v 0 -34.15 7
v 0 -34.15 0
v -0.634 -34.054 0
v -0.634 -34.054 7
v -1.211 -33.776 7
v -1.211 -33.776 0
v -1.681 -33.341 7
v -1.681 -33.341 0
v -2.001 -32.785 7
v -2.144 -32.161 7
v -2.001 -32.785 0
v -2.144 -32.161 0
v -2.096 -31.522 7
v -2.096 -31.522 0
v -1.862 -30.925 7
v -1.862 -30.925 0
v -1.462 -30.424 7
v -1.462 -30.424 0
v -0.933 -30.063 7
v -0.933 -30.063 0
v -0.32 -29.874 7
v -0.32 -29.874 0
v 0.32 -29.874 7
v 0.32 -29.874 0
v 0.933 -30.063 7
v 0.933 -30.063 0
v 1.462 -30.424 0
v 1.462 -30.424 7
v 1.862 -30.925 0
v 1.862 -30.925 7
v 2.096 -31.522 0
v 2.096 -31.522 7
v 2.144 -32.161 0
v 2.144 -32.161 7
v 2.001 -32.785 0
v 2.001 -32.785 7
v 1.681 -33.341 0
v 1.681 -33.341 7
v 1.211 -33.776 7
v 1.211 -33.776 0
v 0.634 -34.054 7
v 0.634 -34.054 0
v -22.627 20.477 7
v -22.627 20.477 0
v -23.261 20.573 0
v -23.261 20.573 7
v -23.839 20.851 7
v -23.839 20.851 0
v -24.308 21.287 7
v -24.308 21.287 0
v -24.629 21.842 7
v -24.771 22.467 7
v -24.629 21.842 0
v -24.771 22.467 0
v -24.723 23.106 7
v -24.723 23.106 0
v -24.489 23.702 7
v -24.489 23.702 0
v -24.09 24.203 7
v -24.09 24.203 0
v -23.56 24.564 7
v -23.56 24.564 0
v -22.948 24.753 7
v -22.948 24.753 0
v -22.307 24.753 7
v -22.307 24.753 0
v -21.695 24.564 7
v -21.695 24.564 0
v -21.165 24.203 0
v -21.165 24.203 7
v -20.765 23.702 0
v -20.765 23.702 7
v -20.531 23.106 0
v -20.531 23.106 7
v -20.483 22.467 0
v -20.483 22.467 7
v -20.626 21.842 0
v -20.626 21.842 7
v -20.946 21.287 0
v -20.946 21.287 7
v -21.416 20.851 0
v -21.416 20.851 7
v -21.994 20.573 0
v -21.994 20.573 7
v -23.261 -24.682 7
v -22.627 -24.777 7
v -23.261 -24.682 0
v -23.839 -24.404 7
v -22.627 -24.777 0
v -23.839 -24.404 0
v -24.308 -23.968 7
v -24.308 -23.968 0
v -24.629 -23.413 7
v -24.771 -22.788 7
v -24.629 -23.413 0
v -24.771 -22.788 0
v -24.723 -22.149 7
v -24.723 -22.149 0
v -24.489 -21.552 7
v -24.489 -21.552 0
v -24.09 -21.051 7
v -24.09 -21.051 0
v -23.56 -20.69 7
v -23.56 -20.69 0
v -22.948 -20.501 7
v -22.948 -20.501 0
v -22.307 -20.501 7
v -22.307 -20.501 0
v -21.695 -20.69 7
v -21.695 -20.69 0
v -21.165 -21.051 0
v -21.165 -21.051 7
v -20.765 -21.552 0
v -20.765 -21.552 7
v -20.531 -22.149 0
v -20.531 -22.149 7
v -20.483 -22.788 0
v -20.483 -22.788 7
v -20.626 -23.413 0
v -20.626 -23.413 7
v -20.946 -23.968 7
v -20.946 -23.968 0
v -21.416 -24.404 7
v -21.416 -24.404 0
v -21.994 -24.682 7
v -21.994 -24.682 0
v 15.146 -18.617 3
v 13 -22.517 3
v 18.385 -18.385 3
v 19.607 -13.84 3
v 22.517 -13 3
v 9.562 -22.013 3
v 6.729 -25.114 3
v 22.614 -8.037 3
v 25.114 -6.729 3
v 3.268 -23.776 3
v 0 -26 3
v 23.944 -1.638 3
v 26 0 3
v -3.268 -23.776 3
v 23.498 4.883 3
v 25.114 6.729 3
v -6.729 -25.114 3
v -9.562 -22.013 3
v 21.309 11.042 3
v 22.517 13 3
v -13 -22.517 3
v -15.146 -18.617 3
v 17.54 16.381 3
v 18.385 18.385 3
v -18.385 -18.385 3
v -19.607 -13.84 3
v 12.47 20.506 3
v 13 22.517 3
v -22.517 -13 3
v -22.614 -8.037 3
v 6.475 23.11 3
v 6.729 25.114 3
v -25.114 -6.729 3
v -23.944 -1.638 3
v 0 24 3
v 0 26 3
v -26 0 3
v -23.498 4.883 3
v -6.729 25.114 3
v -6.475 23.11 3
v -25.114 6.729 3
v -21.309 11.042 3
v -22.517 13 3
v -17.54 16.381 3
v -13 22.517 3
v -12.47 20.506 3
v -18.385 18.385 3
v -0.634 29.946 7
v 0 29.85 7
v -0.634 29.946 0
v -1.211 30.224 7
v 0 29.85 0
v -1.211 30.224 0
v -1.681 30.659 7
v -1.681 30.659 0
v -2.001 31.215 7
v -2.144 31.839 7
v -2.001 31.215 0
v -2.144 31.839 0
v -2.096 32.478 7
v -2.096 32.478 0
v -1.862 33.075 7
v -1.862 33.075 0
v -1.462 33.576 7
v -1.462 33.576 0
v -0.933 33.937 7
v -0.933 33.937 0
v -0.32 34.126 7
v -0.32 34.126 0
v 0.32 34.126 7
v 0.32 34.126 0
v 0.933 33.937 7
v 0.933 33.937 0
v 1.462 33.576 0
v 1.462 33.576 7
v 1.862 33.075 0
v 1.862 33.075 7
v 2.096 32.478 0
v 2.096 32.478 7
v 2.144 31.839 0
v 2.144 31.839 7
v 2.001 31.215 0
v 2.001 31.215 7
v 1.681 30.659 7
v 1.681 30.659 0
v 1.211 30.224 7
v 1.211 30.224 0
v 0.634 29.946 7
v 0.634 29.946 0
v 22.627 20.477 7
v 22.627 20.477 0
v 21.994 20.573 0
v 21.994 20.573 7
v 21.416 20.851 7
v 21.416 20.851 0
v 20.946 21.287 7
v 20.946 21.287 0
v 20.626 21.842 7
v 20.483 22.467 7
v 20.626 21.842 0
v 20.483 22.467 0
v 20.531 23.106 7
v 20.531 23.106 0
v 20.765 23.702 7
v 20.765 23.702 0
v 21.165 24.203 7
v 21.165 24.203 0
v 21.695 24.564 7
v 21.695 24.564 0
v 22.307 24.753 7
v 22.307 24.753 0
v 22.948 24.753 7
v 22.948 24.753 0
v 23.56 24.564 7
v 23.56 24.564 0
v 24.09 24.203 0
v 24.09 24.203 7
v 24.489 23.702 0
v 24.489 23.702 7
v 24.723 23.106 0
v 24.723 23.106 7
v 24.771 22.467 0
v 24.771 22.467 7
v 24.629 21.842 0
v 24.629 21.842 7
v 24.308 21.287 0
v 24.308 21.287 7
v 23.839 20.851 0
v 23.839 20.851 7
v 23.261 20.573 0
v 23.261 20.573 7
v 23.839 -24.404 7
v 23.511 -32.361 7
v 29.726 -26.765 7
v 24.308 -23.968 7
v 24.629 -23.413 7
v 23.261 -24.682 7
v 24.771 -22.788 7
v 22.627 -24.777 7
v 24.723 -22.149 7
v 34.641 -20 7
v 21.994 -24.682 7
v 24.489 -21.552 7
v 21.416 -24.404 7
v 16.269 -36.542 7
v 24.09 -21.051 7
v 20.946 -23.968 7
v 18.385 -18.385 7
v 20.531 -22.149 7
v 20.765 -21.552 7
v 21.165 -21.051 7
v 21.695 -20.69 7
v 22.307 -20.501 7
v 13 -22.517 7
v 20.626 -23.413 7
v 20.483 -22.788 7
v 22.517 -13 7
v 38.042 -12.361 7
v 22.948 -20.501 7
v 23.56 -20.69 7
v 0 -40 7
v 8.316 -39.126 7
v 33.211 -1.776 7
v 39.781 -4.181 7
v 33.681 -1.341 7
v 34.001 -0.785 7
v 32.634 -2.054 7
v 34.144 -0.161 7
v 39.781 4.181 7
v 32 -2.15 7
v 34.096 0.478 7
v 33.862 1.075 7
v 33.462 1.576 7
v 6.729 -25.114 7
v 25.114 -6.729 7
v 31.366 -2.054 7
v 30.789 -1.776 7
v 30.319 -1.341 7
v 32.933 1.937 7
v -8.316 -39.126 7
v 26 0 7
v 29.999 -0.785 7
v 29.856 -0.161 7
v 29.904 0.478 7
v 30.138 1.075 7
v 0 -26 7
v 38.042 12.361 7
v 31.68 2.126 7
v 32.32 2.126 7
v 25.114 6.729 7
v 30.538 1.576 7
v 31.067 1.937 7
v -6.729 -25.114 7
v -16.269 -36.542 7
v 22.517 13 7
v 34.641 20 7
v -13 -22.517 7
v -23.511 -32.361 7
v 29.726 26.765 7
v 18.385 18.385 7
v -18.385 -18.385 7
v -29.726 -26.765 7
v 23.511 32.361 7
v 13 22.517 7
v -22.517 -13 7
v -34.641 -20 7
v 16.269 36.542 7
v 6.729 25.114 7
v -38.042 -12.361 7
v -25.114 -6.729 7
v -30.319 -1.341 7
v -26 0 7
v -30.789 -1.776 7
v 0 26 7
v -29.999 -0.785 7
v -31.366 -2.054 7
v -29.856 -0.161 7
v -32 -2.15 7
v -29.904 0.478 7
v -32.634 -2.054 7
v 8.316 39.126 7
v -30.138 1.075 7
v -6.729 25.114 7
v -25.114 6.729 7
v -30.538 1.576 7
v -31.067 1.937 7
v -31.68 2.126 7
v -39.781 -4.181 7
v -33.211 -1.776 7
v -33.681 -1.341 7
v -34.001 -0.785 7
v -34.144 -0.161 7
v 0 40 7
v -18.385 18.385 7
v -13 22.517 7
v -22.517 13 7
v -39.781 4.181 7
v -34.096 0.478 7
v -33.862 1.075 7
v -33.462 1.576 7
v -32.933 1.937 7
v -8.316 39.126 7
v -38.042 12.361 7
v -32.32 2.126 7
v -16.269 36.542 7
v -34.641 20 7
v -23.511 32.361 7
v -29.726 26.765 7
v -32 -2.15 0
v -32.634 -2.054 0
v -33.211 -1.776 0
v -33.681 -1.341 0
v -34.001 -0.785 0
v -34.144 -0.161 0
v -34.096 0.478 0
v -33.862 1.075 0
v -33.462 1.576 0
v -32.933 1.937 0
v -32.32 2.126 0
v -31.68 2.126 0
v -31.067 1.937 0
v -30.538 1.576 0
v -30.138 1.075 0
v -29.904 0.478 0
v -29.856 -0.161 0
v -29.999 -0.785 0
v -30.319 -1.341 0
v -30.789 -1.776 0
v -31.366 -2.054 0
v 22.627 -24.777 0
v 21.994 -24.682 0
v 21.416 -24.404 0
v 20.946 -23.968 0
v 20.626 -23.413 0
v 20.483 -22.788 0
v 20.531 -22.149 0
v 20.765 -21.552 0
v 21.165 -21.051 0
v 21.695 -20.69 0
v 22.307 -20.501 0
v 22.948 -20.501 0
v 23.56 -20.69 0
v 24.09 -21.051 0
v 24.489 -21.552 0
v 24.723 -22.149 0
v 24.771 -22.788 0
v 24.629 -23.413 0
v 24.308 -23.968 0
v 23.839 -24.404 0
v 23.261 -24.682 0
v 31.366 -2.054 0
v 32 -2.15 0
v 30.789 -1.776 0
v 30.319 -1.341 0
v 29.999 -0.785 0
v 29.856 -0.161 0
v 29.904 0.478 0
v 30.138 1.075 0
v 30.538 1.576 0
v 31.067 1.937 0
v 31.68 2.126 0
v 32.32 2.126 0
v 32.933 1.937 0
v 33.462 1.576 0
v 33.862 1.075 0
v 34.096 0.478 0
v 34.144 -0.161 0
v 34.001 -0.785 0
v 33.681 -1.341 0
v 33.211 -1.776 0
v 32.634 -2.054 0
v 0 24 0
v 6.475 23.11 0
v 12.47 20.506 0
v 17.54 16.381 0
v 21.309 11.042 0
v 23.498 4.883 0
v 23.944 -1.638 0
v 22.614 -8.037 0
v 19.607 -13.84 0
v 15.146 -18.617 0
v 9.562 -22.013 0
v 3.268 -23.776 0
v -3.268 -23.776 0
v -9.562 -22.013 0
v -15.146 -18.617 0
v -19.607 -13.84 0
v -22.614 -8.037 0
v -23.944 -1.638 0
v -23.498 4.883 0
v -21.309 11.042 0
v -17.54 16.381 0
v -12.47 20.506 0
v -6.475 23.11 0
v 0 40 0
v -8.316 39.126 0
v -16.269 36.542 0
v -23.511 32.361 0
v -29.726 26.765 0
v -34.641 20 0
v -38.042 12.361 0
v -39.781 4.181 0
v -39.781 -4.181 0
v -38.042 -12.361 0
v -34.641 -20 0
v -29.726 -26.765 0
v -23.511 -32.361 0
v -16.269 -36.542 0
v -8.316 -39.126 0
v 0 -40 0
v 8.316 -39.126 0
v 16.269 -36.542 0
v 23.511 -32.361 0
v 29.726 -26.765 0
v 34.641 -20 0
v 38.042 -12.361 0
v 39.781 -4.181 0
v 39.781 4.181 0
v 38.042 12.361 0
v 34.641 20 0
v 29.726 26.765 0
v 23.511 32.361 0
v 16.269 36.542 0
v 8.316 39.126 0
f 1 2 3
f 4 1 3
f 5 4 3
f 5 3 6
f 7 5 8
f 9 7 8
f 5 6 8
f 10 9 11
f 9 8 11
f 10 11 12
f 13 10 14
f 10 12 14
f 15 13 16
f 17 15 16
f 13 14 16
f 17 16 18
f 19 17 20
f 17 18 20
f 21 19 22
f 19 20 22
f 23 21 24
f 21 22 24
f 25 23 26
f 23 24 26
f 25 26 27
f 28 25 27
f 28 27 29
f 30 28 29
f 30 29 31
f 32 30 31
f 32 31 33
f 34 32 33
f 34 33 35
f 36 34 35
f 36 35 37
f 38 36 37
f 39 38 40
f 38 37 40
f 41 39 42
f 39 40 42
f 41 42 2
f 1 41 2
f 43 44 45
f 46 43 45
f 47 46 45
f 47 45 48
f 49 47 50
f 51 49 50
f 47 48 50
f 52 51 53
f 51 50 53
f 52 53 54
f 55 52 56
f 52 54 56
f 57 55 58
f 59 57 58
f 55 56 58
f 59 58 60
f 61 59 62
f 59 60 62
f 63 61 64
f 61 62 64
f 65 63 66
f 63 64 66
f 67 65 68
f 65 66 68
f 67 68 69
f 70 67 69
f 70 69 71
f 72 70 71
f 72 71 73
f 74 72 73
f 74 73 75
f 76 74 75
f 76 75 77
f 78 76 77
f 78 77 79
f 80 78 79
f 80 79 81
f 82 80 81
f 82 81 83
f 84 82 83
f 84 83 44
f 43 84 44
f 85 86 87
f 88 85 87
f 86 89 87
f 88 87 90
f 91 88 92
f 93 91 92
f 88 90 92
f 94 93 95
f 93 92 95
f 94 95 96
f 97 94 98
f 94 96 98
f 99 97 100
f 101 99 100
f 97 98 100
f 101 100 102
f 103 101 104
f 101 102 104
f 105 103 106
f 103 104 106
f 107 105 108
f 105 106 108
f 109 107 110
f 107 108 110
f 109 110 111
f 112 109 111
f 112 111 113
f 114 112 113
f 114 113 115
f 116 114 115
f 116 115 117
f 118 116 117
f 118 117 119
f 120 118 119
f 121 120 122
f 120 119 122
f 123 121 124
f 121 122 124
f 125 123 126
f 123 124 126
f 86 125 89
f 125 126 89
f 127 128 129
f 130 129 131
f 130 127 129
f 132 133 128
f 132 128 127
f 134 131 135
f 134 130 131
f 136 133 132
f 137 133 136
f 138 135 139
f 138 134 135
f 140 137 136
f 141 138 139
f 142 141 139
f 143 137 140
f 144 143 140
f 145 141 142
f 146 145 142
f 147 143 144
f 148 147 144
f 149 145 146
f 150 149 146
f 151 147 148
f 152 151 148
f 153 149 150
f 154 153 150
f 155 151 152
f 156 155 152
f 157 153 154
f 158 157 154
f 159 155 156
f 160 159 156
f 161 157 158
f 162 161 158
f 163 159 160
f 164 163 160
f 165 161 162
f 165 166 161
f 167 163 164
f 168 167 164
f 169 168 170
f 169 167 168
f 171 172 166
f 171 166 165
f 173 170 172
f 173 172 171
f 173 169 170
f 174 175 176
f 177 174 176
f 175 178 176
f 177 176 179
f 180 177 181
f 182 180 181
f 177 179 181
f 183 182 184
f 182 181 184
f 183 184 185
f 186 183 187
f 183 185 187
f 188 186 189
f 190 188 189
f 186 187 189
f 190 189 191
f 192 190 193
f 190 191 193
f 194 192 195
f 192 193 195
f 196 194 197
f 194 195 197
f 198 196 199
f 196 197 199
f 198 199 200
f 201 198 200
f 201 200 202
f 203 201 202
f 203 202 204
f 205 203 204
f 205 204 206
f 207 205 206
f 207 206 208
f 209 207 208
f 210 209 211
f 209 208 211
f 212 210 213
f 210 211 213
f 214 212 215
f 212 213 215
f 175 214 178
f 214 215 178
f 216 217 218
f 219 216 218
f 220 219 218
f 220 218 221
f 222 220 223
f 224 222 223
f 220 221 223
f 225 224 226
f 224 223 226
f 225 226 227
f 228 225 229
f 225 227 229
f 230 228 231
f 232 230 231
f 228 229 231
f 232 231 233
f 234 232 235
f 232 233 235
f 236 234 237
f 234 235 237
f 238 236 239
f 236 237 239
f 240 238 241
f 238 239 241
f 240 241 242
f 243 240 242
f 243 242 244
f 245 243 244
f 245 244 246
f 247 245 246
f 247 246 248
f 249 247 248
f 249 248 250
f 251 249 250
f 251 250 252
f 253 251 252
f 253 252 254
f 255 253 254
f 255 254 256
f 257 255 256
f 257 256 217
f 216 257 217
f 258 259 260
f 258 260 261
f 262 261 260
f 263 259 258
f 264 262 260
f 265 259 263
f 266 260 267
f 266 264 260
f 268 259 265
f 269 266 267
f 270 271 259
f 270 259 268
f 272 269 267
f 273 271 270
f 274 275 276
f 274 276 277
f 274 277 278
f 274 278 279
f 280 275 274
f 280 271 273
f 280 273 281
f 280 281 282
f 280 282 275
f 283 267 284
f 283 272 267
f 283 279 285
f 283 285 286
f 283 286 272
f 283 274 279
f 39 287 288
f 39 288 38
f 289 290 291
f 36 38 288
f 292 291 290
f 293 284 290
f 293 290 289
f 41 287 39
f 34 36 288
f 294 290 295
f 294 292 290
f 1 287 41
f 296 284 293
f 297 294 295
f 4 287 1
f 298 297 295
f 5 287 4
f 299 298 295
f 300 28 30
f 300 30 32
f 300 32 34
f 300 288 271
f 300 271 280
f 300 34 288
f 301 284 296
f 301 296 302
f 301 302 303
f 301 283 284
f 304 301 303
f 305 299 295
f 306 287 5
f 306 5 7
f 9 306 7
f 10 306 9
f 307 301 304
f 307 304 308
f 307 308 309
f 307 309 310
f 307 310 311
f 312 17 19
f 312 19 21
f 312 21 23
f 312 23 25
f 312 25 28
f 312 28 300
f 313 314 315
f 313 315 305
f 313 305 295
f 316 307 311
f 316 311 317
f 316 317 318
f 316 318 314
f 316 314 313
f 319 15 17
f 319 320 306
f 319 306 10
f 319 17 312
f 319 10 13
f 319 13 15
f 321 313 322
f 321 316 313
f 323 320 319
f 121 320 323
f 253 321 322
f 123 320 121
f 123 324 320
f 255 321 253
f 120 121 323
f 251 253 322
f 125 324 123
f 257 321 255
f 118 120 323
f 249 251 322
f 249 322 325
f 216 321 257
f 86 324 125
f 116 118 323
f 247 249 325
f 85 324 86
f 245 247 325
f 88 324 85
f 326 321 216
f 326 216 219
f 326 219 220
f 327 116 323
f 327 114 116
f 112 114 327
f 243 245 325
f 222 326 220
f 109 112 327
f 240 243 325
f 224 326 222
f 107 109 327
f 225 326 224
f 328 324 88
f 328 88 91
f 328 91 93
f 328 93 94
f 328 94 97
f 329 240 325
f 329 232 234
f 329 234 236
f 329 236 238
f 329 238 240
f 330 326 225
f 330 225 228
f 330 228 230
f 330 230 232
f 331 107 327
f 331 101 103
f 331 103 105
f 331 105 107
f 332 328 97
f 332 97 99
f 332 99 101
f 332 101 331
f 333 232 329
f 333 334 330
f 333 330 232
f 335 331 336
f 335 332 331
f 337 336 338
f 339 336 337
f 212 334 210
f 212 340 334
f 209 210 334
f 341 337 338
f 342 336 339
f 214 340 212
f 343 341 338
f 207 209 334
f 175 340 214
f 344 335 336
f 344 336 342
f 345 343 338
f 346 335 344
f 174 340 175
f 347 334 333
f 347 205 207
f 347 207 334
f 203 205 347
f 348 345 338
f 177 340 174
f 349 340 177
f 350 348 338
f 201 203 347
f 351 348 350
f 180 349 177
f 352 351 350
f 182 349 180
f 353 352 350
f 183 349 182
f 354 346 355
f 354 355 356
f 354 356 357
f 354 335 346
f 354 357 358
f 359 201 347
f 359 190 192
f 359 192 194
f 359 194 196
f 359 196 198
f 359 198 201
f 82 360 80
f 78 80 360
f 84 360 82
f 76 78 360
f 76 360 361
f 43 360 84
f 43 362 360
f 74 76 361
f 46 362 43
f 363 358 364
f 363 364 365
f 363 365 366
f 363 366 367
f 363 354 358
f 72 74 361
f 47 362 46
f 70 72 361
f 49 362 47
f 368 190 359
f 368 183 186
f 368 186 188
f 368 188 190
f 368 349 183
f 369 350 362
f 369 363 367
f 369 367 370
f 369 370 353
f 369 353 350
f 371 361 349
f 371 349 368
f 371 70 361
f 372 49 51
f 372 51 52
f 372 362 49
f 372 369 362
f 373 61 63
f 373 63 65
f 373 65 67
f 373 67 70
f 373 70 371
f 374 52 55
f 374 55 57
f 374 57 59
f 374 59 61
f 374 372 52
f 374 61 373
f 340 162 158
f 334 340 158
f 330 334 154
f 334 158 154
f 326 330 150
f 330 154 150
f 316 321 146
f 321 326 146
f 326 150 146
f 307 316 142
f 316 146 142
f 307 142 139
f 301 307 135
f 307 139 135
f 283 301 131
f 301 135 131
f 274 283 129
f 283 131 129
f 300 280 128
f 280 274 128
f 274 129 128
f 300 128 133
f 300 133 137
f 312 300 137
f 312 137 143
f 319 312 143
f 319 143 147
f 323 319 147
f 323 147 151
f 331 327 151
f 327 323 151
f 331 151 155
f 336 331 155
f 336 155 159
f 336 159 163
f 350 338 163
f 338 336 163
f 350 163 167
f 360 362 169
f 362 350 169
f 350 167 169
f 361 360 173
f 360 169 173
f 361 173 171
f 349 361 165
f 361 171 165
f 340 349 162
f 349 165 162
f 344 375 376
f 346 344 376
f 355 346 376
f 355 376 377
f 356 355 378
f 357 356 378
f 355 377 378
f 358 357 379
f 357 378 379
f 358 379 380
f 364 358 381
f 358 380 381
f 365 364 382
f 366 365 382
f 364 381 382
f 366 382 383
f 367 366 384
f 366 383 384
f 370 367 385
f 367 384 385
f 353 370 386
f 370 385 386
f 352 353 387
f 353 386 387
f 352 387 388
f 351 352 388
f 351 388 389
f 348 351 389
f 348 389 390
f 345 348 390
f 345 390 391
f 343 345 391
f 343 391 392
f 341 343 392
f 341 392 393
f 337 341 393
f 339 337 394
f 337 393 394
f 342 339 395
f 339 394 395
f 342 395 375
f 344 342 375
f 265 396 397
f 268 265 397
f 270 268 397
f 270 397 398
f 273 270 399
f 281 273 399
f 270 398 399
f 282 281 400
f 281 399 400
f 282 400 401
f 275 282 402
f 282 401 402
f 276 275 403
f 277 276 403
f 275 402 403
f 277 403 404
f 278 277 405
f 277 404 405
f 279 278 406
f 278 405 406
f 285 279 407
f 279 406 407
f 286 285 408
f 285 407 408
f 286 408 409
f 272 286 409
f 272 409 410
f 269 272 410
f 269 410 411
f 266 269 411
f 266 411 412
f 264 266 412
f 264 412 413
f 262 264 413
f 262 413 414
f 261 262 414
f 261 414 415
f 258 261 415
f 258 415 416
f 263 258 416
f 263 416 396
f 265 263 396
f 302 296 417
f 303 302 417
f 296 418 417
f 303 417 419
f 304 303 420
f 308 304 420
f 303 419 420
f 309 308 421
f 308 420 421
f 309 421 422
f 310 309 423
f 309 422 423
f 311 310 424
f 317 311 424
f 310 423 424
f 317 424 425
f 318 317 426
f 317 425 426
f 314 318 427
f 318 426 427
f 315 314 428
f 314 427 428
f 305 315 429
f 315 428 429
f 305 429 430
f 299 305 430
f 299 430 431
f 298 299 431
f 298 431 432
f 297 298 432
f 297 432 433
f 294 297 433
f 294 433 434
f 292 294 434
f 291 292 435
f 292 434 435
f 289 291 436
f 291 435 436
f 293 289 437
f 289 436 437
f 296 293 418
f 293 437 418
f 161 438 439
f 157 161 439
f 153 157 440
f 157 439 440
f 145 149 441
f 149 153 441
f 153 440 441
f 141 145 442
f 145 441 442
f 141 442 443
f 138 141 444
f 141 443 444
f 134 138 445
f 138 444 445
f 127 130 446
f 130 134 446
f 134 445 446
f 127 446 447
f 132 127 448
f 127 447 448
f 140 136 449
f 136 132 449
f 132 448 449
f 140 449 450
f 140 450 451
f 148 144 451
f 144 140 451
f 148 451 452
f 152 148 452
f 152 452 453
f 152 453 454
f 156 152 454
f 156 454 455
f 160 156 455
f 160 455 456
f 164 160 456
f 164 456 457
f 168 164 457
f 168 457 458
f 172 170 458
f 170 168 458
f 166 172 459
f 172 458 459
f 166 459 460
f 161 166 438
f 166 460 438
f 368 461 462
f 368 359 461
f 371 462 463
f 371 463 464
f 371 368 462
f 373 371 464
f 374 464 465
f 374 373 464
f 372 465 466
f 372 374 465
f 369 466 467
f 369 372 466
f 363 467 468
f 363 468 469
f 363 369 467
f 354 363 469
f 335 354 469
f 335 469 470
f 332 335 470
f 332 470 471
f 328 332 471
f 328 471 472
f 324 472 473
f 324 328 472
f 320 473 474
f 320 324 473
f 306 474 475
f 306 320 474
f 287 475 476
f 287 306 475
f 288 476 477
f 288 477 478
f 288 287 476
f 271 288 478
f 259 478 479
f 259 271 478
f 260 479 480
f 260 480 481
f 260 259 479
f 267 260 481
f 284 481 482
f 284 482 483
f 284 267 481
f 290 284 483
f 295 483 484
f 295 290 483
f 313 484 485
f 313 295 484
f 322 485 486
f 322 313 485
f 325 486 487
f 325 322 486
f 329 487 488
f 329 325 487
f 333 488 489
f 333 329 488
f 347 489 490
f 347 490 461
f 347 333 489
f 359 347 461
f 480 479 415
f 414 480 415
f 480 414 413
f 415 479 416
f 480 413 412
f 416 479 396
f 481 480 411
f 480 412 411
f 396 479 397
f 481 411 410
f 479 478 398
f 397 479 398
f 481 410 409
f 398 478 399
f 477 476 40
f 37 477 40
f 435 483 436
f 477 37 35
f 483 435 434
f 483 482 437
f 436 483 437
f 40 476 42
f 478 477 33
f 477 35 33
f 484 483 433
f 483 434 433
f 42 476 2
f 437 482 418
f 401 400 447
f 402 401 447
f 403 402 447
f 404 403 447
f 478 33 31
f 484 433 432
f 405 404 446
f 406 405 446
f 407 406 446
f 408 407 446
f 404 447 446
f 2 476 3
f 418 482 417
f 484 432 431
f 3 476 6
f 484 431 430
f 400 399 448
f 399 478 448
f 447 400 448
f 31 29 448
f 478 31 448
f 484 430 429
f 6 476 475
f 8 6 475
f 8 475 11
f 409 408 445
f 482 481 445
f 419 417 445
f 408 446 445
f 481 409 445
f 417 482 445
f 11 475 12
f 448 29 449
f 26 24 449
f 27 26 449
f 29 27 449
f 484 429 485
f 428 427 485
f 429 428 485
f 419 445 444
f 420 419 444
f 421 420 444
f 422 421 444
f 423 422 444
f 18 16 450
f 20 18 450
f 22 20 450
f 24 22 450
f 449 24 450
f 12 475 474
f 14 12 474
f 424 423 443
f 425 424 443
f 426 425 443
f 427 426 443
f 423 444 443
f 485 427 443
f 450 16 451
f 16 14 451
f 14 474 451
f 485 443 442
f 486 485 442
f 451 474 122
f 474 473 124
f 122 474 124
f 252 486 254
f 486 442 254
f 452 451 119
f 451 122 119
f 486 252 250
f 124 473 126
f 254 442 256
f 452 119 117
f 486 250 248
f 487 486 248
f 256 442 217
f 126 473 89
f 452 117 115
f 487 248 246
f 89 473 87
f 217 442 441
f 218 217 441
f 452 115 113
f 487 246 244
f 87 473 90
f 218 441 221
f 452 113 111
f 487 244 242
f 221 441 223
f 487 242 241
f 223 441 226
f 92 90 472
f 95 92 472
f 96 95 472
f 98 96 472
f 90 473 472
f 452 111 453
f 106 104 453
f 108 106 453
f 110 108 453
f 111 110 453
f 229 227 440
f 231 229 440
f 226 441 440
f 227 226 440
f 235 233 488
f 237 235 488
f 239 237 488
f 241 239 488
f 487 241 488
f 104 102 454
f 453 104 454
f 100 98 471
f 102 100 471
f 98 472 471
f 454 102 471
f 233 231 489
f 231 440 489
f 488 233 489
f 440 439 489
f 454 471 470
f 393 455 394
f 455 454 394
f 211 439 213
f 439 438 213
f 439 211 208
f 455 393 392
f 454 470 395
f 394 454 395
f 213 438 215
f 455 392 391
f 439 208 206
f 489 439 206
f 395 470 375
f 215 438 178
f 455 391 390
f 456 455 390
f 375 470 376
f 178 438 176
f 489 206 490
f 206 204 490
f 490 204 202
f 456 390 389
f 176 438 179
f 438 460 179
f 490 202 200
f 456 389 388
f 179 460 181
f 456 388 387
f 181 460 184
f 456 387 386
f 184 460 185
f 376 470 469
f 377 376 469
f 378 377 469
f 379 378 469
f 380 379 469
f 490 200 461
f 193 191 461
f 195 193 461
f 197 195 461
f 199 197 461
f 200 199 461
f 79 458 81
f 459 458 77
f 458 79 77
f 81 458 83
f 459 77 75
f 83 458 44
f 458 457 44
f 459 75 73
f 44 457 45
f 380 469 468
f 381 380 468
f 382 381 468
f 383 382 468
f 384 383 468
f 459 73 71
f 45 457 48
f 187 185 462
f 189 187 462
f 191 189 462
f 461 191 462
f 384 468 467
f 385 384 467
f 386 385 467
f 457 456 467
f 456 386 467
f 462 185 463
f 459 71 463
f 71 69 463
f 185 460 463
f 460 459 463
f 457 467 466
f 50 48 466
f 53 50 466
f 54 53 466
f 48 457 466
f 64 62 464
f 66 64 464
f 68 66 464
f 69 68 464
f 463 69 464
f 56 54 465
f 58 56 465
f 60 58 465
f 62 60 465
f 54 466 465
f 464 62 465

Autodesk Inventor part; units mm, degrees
ref_plane "YZ Plane" through (0, 0, 0) normal (1, 0, 0) x (0, 1, 0)
ref_plane "XZ Plane" through (0, 0, 0) normal (0, 1, 0) x (-1, 0, 0)
ref_plane "XY Plane" through (0, 0, 0) normal (0, 0, 1) x (1, 0, 0)
sketch "スケッチ1" plane through (0, 0, 0) normal (1, 0, 0) x (0, 1, 0)
  line L0 (24, 0) -> (40, 0)
  line L1 (40, 0) -> (40, 7)
  line L2 (40, 7) -> (26, 7)
  line L3 (26, 7) -> (26, 3)
  line L4 (26, 3) -> (24, 3)
  line L5 (24, 3) -> (24, 0)
  line L6 (0, -1.4) -> (0, 8.4) projected
  point P0 (0, 0)
  dimension "d0" = 24
  dimension "d1" = 40
  dimension "d2" = 26
  dimension "d3" = 4
  dimension "d5" = 3
revolve "回転1" add sketch "スケッチ1" angle 360 about axis through (0, 0, -10) along (0, 0, 1)
sketch "スケッチ2" plane through (0, 0, 7) normal (0, 0, 1) x (1, 0, 0)
  circle A0 centre (0, 0) radius 32
  point P0 (0, 32)
  point P1 (-22.6274, 22.6274)
  point P2 (-32, 0)
  point P3 (-22.6274, -22.6274)
  point P4 (0, -32)
  point P5 (22.6274, -22.6274)
  point P6 (32, 0)
  point P7 (22.6274, 22.6274)
  dimension "d7" = 64
  dimension "d10" = 360
hole "穴1" at (0, 32, 7) at (-22.6274, 22.6274, 7) at (-32, 0, 7) at (-22.6274, -22.6274, 7) at (0, -32, 7) at (22.6274, -22.6274, 7) at (32, 0, 7) at (22.6274, 22.6274, 7) direction (0, 0, -1) diameter 4.3 end through all clearance for "Socket Head Cap Screw" size "M4" standard "Ansi Metric M Profile"
properties part number "base8" material "ABS プラスチック"
